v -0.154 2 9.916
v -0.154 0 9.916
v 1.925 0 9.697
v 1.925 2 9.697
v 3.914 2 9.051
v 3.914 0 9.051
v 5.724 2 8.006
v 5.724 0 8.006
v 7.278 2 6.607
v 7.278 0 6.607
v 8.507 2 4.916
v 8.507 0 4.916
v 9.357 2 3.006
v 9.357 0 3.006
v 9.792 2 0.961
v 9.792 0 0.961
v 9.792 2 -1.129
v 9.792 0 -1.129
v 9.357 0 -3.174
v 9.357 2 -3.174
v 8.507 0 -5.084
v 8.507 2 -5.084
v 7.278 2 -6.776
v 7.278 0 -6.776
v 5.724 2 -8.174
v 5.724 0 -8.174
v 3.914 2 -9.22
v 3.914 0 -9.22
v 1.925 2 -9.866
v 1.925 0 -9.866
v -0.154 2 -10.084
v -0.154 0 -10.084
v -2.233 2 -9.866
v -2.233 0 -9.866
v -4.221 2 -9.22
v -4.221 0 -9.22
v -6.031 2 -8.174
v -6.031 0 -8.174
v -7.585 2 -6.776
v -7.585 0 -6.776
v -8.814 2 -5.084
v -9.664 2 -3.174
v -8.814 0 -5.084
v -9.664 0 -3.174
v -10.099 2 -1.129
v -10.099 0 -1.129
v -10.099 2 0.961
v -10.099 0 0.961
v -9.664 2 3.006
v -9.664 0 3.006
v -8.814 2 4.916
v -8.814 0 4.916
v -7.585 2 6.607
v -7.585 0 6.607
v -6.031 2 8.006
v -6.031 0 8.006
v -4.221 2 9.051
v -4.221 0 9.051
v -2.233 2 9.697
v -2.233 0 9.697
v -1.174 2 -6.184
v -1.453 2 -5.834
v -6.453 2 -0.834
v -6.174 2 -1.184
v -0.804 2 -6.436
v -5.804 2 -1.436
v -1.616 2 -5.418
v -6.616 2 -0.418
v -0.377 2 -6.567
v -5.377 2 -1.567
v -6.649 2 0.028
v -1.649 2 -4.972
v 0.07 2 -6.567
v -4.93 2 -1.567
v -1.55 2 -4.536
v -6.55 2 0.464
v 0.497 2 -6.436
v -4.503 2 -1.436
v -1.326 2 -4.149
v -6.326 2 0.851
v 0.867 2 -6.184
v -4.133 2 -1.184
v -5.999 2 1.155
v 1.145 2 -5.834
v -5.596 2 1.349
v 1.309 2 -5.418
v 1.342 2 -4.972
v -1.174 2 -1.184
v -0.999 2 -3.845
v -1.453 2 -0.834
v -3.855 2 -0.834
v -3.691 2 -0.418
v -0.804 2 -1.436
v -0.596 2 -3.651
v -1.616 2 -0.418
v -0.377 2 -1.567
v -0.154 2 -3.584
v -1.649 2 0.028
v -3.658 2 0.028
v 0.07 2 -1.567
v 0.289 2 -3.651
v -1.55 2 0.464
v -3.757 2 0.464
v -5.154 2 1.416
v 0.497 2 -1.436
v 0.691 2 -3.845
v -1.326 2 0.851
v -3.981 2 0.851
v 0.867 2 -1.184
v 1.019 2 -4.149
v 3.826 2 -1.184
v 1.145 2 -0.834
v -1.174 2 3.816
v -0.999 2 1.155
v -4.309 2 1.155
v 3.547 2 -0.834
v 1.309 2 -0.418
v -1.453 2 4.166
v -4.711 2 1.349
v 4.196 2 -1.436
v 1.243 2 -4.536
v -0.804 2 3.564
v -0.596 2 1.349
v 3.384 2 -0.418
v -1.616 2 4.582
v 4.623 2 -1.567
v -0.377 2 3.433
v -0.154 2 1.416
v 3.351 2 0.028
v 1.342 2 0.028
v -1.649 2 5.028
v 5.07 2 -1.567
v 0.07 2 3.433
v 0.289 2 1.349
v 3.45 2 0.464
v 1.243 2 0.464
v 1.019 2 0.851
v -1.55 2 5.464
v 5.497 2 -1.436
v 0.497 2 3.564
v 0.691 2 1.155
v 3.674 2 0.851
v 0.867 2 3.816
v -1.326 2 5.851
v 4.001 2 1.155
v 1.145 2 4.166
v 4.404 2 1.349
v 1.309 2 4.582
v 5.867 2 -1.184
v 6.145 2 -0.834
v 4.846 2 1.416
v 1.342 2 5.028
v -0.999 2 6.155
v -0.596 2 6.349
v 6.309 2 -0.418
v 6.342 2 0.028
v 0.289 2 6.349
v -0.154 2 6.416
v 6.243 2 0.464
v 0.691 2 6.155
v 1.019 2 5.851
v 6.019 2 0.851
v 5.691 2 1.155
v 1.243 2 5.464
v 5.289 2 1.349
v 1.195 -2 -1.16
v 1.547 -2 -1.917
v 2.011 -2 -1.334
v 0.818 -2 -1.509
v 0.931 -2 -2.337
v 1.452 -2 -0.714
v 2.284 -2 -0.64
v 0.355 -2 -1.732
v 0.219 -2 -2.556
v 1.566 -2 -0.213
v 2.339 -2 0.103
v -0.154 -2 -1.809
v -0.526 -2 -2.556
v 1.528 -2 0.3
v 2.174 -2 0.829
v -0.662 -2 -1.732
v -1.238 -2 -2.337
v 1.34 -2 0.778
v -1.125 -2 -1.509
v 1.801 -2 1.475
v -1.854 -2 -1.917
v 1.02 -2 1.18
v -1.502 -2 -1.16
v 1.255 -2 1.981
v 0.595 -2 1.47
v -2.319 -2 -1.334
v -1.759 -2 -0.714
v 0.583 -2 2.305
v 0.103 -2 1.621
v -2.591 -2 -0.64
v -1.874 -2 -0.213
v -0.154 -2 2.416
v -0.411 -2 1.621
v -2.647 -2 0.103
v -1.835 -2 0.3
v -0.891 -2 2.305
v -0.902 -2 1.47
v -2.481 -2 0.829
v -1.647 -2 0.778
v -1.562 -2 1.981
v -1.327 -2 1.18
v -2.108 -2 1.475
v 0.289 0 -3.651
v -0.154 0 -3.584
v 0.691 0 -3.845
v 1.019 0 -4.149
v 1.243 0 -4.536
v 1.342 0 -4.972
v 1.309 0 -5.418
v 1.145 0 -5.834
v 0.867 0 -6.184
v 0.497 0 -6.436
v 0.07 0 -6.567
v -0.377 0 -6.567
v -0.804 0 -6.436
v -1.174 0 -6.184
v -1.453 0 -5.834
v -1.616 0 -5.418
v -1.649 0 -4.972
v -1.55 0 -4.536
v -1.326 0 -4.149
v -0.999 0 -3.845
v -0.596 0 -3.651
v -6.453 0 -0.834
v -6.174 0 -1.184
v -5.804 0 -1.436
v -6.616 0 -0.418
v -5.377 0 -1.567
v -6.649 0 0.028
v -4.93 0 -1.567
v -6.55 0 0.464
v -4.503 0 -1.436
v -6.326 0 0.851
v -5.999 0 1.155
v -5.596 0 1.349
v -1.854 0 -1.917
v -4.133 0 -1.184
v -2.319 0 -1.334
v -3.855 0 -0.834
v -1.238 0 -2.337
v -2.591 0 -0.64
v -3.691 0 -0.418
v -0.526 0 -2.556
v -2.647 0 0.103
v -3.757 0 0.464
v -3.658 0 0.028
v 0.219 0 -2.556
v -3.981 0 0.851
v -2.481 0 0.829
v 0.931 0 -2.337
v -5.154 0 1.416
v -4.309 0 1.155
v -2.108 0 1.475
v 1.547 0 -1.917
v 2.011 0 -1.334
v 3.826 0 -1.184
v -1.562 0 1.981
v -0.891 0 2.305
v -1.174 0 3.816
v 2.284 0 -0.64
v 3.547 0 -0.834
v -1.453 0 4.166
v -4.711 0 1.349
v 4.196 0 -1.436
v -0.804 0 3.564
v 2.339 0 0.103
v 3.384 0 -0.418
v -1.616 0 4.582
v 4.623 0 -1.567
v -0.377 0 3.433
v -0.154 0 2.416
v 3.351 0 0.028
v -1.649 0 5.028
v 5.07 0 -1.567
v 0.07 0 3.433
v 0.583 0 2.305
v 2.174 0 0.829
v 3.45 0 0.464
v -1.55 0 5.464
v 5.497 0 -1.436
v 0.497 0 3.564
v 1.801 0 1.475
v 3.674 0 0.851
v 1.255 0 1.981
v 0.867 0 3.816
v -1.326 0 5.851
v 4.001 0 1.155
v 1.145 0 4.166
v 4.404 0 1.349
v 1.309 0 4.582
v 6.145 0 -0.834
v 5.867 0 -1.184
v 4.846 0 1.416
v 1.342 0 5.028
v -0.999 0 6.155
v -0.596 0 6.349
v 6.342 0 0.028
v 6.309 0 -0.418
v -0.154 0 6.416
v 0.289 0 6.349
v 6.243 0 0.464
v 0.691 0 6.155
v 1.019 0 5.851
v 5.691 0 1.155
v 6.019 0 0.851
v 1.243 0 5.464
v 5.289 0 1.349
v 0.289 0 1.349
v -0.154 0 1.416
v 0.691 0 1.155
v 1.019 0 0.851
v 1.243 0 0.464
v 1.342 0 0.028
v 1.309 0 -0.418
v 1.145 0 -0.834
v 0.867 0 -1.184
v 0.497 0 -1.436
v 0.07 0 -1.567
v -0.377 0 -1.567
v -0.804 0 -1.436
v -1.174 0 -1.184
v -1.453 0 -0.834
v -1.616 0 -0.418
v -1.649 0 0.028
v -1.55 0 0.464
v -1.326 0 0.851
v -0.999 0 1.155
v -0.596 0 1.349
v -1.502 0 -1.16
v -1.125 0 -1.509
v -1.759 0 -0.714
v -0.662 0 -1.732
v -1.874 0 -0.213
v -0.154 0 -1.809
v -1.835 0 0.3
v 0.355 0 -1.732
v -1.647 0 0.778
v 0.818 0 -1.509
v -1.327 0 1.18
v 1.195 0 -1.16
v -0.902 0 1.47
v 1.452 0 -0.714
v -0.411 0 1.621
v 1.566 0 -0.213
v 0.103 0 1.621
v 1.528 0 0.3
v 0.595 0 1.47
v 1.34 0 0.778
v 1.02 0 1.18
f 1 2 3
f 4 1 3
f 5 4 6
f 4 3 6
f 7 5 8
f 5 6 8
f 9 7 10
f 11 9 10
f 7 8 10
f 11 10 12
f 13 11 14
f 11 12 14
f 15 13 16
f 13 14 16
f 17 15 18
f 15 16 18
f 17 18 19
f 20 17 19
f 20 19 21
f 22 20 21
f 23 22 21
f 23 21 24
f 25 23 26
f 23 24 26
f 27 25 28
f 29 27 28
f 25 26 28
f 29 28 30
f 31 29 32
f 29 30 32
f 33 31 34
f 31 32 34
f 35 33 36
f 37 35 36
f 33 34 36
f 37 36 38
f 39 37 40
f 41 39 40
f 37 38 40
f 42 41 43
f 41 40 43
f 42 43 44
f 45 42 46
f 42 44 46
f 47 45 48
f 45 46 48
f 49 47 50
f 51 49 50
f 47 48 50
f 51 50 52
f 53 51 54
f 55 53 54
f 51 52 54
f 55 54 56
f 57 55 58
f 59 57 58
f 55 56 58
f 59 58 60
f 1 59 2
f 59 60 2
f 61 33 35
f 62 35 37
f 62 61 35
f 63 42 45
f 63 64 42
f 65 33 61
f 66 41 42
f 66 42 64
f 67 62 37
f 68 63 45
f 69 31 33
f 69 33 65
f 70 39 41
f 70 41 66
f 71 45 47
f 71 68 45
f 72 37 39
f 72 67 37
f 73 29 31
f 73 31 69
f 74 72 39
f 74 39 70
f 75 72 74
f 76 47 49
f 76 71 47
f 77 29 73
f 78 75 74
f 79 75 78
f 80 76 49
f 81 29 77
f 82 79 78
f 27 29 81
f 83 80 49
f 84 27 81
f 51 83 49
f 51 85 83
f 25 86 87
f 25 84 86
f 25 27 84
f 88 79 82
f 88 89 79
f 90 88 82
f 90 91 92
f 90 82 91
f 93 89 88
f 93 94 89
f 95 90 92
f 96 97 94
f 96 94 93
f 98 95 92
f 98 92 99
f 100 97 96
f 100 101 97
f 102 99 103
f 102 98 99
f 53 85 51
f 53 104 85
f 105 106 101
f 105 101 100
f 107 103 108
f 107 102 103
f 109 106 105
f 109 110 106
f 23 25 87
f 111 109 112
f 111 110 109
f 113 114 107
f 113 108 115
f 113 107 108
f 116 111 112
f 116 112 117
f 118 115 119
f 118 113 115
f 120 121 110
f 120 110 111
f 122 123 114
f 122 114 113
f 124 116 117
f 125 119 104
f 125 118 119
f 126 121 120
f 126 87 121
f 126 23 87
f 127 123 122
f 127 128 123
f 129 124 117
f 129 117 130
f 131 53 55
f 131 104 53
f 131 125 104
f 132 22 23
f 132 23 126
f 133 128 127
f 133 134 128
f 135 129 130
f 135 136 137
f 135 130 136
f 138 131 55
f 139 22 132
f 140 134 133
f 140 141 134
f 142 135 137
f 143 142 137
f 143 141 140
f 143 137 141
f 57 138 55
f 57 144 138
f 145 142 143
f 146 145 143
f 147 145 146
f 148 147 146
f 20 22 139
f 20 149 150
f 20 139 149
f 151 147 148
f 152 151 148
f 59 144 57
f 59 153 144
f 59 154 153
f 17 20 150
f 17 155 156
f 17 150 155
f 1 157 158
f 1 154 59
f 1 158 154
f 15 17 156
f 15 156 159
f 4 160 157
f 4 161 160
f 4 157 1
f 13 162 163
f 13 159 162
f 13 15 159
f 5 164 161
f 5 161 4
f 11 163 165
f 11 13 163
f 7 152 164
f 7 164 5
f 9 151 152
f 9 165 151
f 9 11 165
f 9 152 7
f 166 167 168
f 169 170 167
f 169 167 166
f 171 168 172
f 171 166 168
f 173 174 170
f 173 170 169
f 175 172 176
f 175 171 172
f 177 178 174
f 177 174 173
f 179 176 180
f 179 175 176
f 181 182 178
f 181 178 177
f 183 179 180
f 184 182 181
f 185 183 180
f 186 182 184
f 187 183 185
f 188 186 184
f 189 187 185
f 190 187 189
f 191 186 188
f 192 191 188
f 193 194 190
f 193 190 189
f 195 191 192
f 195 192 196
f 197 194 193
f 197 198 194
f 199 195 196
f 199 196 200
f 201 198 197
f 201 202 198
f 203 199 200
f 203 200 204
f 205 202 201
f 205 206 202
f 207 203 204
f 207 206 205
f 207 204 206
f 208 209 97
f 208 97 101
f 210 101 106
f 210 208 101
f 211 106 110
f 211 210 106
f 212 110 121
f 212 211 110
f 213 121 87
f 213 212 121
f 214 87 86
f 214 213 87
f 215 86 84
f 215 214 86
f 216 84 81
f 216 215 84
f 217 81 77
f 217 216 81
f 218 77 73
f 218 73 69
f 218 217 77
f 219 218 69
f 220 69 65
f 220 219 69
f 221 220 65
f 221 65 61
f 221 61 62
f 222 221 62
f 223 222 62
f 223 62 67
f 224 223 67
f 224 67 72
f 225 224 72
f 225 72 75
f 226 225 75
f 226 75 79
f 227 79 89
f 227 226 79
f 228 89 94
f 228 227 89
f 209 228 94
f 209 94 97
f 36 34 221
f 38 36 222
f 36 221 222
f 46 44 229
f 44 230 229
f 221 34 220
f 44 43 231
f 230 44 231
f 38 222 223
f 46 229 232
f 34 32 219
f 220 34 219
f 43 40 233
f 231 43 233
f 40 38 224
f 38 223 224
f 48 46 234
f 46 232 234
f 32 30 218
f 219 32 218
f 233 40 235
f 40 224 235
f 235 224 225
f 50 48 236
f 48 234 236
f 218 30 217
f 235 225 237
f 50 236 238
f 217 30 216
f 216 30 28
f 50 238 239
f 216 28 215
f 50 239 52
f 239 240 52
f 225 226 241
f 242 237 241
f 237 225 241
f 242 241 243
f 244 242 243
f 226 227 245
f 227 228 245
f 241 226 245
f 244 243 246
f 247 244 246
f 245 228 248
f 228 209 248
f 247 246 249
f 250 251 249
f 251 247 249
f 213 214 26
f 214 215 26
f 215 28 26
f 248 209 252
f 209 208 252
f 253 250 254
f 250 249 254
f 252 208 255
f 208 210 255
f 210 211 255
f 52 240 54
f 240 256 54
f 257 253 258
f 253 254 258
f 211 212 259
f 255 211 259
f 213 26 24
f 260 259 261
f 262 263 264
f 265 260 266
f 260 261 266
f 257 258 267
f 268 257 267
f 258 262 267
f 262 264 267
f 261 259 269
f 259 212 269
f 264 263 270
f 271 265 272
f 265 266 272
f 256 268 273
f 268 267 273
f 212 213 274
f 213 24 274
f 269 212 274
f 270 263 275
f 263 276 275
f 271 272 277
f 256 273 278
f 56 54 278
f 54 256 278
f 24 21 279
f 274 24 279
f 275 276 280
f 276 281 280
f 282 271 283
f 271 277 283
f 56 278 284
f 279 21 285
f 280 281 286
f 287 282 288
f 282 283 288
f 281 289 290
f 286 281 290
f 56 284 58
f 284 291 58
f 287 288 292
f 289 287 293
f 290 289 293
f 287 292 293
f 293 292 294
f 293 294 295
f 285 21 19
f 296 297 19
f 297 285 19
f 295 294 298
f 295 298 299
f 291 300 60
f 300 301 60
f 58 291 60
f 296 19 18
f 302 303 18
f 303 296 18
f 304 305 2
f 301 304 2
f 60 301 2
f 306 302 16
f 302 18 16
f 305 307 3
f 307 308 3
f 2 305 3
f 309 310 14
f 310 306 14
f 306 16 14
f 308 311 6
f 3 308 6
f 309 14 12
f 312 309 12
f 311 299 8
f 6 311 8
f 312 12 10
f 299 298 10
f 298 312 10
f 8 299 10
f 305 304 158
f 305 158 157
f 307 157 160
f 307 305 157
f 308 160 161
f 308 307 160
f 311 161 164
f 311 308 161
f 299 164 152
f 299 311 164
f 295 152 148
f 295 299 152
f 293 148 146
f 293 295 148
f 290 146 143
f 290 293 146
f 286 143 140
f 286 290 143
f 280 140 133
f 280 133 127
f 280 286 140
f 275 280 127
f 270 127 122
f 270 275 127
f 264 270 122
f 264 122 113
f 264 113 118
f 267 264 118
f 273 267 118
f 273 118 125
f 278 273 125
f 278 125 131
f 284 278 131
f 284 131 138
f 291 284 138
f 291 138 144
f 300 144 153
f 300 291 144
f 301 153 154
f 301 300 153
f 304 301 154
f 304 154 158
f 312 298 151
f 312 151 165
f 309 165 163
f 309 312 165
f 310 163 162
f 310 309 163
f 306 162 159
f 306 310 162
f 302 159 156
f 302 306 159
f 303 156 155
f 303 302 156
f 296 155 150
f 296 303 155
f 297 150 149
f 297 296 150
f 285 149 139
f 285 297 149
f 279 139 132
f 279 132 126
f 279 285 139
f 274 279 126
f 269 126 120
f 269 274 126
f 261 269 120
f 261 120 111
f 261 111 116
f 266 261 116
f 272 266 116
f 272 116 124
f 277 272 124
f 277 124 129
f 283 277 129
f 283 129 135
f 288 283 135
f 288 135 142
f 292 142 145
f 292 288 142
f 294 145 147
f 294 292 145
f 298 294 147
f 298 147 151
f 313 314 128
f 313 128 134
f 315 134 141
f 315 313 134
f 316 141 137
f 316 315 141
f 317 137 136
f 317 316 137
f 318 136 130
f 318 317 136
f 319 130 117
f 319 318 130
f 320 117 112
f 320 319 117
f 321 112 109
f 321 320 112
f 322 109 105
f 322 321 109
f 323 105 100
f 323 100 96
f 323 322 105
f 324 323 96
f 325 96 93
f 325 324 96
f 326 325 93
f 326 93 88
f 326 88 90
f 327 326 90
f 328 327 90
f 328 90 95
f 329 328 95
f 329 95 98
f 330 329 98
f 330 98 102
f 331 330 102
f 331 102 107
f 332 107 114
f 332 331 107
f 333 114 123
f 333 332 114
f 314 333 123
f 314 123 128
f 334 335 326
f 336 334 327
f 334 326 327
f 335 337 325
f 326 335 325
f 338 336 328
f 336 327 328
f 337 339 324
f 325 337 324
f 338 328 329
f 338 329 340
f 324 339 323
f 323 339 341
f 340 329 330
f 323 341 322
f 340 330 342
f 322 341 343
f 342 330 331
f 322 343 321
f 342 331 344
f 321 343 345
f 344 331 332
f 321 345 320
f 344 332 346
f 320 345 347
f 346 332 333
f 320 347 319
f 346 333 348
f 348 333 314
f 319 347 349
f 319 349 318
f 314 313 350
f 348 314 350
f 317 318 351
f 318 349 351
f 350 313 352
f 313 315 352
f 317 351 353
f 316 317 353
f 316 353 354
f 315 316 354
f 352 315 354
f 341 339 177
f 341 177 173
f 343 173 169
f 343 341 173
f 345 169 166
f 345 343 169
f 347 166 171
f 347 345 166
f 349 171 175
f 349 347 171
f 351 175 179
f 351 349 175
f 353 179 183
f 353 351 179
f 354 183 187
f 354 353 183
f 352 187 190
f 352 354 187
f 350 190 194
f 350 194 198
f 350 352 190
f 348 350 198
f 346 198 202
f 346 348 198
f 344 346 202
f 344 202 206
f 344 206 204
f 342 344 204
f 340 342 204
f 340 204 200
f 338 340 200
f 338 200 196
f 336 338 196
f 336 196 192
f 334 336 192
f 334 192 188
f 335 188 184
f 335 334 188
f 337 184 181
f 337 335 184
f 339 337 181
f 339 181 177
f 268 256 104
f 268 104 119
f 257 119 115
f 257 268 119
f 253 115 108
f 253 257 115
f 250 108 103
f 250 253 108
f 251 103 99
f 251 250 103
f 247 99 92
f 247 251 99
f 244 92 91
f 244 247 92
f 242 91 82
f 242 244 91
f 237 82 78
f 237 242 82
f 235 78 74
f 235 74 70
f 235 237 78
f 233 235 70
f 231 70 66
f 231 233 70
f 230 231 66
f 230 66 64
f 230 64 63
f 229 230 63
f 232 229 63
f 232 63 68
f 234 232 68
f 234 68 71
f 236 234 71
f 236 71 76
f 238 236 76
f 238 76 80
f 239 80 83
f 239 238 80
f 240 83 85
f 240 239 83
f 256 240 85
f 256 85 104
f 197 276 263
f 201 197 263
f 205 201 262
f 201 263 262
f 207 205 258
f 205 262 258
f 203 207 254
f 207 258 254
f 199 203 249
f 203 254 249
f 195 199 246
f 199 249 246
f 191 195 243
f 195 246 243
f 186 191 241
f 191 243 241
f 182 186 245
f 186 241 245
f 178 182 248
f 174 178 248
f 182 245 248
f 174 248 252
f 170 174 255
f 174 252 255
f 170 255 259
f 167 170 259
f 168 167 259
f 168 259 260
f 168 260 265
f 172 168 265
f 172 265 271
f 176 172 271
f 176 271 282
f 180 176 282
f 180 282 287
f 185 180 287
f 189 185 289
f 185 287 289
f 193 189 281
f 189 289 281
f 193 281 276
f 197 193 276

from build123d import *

# Parameters (mm, degrees)
IZIM1_R                     = 10
IZIM1_R_2                   = 1.5
Y_KSEKLIK_EKSTR_ZYON1_DEPTH = 2
IZIM2_R                     = 2.5
IZIM2_R_2                   = 1.724737241
Y_KSEKLIK_EKSTR_ZYON2_DEPTH = 2


with BuildPart() as part:
    # Çizim1 → Yükseklik-Ekstrüzyon1 (new body)
    with BuildSketch(Plane(origin=(0, 0, 0), x_dir=(1, 0, 0), z_dir=(0, 1, 0))):
        with Locations(Location((-0.153619206, 0.084194337, 0), (0, 0, 270))):
            Circle(IZIM1_R)
        with Locations(Location((-0.153619206, 0.084194337, 0), (0, 0, 270))):
            Circle(IZIM1_R_2, mode=Mode.SUBTRACT)
        with Locations(Location((-0.153619206, 5.084194337, 0), (0, 0, 270))):
            Circle(IZIM1_R_2, mode=Mode.SUBTRACT)
        with Locations(Location((-5.153619206, 0.084194337, 0), (0, 0, 270))):
            Circle(IZIM1_R_2, mode=Mode.SUBTRACT)
        with Locations(Location((4.846380794, 0.084194337, 0), (0, 0, 270))):
            Circle(IZIM1_R_2, mode=Mode.SUBTRACT)
        with Locations(Location((-0.153619206, -4.915805663, 0), (0, 0, 270))):
            Circle(IZIM1_R_2, mode=Mode.SUBTRACT)
    extrude(amount=Y_KSEKLIK_EKSTR_ZYON1_DEPTH)

    # Çizim2 → Yükseklik-Ekstrüzyon2 (add)
    with BuildSketch(Plane.XZ):
        with Locations(Location((-0.153619206, -0.084194337, 0), (0, 0, 90))):
            Circle(IZIM2_R)
        with Locations(Location((-0.153619206, -0.084194337, 0), (0, 0, 270))):
            Circle(IZIM2_R_2, mode=Mode.SUBTRACT)
    extrude(amount=Y_KSEKLIK_EKSTR_ZYON2_DEPTH)


solid = part.part
